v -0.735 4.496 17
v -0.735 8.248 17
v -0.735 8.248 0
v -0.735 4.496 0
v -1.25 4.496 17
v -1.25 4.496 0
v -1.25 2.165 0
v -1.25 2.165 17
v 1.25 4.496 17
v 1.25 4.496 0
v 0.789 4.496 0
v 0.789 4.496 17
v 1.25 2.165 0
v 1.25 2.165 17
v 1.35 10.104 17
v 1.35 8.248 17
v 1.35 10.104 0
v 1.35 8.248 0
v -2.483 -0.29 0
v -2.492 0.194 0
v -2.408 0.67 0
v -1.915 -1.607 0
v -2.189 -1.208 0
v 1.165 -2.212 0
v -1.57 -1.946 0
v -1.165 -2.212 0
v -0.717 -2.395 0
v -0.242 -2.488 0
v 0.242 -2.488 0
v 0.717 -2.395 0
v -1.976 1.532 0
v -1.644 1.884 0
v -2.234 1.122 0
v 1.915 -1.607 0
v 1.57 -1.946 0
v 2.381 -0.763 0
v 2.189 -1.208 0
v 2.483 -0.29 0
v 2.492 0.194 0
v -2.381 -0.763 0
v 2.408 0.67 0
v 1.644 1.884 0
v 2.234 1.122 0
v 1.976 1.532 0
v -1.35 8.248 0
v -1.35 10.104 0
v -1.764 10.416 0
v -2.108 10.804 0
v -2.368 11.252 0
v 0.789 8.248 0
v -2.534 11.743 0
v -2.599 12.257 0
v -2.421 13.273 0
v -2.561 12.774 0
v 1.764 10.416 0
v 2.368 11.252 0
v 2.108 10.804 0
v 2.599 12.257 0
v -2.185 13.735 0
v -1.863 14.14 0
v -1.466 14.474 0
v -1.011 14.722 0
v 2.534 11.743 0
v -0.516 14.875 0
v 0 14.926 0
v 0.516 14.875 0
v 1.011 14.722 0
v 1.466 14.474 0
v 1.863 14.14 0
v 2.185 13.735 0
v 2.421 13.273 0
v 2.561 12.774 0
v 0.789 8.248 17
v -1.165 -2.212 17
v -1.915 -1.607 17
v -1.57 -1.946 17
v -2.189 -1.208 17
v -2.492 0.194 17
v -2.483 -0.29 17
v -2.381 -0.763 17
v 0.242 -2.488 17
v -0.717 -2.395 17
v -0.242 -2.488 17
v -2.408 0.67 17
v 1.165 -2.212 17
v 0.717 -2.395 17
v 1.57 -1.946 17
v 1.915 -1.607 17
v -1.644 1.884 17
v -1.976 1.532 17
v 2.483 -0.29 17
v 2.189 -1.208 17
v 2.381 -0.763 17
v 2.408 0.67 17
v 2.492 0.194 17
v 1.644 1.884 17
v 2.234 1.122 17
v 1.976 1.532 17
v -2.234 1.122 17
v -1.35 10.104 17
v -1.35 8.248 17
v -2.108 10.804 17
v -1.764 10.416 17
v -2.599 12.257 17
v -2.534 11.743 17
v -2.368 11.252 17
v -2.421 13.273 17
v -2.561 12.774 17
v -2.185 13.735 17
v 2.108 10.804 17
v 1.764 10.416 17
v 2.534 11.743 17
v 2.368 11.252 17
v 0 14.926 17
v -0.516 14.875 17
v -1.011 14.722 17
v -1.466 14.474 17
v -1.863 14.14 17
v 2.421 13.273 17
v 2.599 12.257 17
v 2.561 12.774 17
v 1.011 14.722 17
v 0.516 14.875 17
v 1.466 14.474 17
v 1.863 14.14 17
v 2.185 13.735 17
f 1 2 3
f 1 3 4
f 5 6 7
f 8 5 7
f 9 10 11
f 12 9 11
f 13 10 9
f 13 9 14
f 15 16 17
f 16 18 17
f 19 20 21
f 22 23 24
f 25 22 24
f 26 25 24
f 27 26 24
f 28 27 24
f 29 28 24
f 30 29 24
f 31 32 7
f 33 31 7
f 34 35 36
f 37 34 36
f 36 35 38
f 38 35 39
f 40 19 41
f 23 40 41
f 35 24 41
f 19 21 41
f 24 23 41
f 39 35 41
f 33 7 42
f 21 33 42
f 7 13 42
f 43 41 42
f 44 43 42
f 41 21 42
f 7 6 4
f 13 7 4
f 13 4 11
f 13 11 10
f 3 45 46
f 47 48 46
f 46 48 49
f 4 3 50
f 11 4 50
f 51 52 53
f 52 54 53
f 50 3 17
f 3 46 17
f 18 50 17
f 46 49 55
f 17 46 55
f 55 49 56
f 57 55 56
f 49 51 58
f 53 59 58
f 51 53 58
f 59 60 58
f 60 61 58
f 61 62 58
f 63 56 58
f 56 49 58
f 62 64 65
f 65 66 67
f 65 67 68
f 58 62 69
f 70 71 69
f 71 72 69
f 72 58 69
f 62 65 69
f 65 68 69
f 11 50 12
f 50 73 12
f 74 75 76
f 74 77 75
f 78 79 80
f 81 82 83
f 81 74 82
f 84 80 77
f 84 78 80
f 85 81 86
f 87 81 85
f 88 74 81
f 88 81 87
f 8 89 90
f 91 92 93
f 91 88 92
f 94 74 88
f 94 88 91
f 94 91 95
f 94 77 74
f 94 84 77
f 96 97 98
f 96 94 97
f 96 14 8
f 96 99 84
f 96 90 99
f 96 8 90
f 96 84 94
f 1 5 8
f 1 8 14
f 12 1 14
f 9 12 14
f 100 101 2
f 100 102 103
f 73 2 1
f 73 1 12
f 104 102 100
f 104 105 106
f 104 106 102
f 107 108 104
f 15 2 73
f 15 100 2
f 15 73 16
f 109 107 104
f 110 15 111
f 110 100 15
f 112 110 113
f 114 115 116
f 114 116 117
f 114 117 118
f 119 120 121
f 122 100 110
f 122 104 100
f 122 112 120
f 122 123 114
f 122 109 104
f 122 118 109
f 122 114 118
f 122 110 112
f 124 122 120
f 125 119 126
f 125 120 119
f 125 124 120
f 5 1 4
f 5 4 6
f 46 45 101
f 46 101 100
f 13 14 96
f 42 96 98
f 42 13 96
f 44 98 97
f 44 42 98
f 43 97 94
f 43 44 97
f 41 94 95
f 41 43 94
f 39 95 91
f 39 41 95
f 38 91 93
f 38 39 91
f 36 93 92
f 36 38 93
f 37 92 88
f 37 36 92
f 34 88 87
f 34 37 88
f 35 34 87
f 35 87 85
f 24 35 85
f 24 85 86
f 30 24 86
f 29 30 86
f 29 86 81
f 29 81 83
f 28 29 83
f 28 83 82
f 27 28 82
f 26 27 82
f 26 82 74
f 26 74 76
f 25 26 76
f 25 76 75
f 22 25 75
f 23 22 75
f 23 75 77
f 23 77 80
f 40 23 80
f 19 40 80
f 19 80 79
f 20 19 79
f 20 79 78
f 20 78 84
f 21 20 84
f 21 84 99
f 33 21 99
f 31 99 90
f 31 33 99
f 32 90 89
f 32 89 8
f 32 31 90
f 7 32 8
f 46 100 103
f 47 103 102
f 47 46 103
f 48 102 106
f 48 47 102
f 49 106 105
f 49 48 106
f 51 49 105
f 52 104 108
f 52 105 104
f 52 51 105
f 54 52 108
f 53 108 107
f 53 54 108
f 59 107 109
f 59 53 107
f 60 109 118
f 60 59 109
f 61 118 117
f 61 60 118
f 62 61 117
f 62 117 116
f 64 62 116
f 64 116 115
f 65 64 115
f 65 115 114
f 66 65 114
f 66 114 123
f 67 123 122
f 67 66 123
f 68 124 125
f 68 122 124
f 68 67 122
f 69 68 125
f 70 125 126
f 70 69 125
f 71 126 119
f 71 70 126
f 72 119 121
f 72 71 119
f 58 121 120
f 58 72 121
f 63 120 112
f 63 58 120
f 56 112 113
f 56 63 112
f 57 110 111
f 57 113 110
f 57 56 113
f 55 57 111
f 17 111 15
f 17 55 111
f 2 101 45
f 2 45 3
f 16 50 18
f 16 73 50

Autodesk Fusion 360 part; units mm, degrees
sketch "Sketch1" plane through (0, 0, 0) normal (0, 0, 1) x (1, 0, 0)
  circle A0 centre (0, 0) radius 2.5
  line L0 (-1.35, 2.1042) -> (-1.35, 10.1042)
  line L1 (1.35, 2.1042) -> (1.35, 10.1042)
  circle A1 centre (0, 12.3262) radius 2.6
  dimension "d1" = 5
  dimension "d4" = 1.35
  dimension "d5" = 5.2
  dimension "d6" = 8
  dimension "d7" = 8
  dimension "d12" = 2.7
extrude "Extrude1" add sketch "Sketch1" along normal blind 17
sketch "Sketch2" plane through (0, 0, 17) normal (0, 0, 1) x (-1, 0, 0)
  arc A0 (1.35, -2.1042) -> (-1.35, -2.1042) centre (0, 0) ccw
  line L0 (-1.35, -2.1042) -> (-1.35, -10.1042)
  arc A1 (-1.35, -10.1042) -> (1.35, -10.1042) centre (0, -12.3262) ccw
  line L1 (1.35, -10.1042) -> (1.35, -2.1042)
  line L2 (1.35, -8.2485) -> (-1.35, -8.2485)
  line L3 (-1.35, -8.2485) -> (-1.35, -4.4962)
  line L4 (-1.35, -4.4962) -> (1.35, -4.4962)
  line L5 (1.35, -4.4962) -> (1.35, -8.2485)
  line L6 (0.7348, -8.2485) -> (0.7348, -4.4962)
  line L7 (-0.7891, -8.2485) -> (-0.7891, -4.4962)
  arc A2 (1.35, -2.1042) -> (-1.35, -2.1042) centre (0, 0) ccw
  circle A3 centre (0, 0) radius 2.5
  line L8 (1.25, -4.4962) -> (1.25, -2.1651)
  line L9 (-1.25, -4.4962) -> (-1.25, -2.1651)
  line L10 (1.35, -2.1042) -> (1.35, -4.4962)
  line L11 (-1.35, -4.4962) -> (-1.35, -2.1042)
  dimension "d13" = 2.5
  dimension "d14" = 1.25
extrude "Extrude2" cut sketch "Sketch2" against normal blind 17 contours L1 L4 A3 L8 L10 | L1 L2 L4 L5 L6 | L0 L4 A3 L9 L11 | L0 L2 L3 L4 L7
